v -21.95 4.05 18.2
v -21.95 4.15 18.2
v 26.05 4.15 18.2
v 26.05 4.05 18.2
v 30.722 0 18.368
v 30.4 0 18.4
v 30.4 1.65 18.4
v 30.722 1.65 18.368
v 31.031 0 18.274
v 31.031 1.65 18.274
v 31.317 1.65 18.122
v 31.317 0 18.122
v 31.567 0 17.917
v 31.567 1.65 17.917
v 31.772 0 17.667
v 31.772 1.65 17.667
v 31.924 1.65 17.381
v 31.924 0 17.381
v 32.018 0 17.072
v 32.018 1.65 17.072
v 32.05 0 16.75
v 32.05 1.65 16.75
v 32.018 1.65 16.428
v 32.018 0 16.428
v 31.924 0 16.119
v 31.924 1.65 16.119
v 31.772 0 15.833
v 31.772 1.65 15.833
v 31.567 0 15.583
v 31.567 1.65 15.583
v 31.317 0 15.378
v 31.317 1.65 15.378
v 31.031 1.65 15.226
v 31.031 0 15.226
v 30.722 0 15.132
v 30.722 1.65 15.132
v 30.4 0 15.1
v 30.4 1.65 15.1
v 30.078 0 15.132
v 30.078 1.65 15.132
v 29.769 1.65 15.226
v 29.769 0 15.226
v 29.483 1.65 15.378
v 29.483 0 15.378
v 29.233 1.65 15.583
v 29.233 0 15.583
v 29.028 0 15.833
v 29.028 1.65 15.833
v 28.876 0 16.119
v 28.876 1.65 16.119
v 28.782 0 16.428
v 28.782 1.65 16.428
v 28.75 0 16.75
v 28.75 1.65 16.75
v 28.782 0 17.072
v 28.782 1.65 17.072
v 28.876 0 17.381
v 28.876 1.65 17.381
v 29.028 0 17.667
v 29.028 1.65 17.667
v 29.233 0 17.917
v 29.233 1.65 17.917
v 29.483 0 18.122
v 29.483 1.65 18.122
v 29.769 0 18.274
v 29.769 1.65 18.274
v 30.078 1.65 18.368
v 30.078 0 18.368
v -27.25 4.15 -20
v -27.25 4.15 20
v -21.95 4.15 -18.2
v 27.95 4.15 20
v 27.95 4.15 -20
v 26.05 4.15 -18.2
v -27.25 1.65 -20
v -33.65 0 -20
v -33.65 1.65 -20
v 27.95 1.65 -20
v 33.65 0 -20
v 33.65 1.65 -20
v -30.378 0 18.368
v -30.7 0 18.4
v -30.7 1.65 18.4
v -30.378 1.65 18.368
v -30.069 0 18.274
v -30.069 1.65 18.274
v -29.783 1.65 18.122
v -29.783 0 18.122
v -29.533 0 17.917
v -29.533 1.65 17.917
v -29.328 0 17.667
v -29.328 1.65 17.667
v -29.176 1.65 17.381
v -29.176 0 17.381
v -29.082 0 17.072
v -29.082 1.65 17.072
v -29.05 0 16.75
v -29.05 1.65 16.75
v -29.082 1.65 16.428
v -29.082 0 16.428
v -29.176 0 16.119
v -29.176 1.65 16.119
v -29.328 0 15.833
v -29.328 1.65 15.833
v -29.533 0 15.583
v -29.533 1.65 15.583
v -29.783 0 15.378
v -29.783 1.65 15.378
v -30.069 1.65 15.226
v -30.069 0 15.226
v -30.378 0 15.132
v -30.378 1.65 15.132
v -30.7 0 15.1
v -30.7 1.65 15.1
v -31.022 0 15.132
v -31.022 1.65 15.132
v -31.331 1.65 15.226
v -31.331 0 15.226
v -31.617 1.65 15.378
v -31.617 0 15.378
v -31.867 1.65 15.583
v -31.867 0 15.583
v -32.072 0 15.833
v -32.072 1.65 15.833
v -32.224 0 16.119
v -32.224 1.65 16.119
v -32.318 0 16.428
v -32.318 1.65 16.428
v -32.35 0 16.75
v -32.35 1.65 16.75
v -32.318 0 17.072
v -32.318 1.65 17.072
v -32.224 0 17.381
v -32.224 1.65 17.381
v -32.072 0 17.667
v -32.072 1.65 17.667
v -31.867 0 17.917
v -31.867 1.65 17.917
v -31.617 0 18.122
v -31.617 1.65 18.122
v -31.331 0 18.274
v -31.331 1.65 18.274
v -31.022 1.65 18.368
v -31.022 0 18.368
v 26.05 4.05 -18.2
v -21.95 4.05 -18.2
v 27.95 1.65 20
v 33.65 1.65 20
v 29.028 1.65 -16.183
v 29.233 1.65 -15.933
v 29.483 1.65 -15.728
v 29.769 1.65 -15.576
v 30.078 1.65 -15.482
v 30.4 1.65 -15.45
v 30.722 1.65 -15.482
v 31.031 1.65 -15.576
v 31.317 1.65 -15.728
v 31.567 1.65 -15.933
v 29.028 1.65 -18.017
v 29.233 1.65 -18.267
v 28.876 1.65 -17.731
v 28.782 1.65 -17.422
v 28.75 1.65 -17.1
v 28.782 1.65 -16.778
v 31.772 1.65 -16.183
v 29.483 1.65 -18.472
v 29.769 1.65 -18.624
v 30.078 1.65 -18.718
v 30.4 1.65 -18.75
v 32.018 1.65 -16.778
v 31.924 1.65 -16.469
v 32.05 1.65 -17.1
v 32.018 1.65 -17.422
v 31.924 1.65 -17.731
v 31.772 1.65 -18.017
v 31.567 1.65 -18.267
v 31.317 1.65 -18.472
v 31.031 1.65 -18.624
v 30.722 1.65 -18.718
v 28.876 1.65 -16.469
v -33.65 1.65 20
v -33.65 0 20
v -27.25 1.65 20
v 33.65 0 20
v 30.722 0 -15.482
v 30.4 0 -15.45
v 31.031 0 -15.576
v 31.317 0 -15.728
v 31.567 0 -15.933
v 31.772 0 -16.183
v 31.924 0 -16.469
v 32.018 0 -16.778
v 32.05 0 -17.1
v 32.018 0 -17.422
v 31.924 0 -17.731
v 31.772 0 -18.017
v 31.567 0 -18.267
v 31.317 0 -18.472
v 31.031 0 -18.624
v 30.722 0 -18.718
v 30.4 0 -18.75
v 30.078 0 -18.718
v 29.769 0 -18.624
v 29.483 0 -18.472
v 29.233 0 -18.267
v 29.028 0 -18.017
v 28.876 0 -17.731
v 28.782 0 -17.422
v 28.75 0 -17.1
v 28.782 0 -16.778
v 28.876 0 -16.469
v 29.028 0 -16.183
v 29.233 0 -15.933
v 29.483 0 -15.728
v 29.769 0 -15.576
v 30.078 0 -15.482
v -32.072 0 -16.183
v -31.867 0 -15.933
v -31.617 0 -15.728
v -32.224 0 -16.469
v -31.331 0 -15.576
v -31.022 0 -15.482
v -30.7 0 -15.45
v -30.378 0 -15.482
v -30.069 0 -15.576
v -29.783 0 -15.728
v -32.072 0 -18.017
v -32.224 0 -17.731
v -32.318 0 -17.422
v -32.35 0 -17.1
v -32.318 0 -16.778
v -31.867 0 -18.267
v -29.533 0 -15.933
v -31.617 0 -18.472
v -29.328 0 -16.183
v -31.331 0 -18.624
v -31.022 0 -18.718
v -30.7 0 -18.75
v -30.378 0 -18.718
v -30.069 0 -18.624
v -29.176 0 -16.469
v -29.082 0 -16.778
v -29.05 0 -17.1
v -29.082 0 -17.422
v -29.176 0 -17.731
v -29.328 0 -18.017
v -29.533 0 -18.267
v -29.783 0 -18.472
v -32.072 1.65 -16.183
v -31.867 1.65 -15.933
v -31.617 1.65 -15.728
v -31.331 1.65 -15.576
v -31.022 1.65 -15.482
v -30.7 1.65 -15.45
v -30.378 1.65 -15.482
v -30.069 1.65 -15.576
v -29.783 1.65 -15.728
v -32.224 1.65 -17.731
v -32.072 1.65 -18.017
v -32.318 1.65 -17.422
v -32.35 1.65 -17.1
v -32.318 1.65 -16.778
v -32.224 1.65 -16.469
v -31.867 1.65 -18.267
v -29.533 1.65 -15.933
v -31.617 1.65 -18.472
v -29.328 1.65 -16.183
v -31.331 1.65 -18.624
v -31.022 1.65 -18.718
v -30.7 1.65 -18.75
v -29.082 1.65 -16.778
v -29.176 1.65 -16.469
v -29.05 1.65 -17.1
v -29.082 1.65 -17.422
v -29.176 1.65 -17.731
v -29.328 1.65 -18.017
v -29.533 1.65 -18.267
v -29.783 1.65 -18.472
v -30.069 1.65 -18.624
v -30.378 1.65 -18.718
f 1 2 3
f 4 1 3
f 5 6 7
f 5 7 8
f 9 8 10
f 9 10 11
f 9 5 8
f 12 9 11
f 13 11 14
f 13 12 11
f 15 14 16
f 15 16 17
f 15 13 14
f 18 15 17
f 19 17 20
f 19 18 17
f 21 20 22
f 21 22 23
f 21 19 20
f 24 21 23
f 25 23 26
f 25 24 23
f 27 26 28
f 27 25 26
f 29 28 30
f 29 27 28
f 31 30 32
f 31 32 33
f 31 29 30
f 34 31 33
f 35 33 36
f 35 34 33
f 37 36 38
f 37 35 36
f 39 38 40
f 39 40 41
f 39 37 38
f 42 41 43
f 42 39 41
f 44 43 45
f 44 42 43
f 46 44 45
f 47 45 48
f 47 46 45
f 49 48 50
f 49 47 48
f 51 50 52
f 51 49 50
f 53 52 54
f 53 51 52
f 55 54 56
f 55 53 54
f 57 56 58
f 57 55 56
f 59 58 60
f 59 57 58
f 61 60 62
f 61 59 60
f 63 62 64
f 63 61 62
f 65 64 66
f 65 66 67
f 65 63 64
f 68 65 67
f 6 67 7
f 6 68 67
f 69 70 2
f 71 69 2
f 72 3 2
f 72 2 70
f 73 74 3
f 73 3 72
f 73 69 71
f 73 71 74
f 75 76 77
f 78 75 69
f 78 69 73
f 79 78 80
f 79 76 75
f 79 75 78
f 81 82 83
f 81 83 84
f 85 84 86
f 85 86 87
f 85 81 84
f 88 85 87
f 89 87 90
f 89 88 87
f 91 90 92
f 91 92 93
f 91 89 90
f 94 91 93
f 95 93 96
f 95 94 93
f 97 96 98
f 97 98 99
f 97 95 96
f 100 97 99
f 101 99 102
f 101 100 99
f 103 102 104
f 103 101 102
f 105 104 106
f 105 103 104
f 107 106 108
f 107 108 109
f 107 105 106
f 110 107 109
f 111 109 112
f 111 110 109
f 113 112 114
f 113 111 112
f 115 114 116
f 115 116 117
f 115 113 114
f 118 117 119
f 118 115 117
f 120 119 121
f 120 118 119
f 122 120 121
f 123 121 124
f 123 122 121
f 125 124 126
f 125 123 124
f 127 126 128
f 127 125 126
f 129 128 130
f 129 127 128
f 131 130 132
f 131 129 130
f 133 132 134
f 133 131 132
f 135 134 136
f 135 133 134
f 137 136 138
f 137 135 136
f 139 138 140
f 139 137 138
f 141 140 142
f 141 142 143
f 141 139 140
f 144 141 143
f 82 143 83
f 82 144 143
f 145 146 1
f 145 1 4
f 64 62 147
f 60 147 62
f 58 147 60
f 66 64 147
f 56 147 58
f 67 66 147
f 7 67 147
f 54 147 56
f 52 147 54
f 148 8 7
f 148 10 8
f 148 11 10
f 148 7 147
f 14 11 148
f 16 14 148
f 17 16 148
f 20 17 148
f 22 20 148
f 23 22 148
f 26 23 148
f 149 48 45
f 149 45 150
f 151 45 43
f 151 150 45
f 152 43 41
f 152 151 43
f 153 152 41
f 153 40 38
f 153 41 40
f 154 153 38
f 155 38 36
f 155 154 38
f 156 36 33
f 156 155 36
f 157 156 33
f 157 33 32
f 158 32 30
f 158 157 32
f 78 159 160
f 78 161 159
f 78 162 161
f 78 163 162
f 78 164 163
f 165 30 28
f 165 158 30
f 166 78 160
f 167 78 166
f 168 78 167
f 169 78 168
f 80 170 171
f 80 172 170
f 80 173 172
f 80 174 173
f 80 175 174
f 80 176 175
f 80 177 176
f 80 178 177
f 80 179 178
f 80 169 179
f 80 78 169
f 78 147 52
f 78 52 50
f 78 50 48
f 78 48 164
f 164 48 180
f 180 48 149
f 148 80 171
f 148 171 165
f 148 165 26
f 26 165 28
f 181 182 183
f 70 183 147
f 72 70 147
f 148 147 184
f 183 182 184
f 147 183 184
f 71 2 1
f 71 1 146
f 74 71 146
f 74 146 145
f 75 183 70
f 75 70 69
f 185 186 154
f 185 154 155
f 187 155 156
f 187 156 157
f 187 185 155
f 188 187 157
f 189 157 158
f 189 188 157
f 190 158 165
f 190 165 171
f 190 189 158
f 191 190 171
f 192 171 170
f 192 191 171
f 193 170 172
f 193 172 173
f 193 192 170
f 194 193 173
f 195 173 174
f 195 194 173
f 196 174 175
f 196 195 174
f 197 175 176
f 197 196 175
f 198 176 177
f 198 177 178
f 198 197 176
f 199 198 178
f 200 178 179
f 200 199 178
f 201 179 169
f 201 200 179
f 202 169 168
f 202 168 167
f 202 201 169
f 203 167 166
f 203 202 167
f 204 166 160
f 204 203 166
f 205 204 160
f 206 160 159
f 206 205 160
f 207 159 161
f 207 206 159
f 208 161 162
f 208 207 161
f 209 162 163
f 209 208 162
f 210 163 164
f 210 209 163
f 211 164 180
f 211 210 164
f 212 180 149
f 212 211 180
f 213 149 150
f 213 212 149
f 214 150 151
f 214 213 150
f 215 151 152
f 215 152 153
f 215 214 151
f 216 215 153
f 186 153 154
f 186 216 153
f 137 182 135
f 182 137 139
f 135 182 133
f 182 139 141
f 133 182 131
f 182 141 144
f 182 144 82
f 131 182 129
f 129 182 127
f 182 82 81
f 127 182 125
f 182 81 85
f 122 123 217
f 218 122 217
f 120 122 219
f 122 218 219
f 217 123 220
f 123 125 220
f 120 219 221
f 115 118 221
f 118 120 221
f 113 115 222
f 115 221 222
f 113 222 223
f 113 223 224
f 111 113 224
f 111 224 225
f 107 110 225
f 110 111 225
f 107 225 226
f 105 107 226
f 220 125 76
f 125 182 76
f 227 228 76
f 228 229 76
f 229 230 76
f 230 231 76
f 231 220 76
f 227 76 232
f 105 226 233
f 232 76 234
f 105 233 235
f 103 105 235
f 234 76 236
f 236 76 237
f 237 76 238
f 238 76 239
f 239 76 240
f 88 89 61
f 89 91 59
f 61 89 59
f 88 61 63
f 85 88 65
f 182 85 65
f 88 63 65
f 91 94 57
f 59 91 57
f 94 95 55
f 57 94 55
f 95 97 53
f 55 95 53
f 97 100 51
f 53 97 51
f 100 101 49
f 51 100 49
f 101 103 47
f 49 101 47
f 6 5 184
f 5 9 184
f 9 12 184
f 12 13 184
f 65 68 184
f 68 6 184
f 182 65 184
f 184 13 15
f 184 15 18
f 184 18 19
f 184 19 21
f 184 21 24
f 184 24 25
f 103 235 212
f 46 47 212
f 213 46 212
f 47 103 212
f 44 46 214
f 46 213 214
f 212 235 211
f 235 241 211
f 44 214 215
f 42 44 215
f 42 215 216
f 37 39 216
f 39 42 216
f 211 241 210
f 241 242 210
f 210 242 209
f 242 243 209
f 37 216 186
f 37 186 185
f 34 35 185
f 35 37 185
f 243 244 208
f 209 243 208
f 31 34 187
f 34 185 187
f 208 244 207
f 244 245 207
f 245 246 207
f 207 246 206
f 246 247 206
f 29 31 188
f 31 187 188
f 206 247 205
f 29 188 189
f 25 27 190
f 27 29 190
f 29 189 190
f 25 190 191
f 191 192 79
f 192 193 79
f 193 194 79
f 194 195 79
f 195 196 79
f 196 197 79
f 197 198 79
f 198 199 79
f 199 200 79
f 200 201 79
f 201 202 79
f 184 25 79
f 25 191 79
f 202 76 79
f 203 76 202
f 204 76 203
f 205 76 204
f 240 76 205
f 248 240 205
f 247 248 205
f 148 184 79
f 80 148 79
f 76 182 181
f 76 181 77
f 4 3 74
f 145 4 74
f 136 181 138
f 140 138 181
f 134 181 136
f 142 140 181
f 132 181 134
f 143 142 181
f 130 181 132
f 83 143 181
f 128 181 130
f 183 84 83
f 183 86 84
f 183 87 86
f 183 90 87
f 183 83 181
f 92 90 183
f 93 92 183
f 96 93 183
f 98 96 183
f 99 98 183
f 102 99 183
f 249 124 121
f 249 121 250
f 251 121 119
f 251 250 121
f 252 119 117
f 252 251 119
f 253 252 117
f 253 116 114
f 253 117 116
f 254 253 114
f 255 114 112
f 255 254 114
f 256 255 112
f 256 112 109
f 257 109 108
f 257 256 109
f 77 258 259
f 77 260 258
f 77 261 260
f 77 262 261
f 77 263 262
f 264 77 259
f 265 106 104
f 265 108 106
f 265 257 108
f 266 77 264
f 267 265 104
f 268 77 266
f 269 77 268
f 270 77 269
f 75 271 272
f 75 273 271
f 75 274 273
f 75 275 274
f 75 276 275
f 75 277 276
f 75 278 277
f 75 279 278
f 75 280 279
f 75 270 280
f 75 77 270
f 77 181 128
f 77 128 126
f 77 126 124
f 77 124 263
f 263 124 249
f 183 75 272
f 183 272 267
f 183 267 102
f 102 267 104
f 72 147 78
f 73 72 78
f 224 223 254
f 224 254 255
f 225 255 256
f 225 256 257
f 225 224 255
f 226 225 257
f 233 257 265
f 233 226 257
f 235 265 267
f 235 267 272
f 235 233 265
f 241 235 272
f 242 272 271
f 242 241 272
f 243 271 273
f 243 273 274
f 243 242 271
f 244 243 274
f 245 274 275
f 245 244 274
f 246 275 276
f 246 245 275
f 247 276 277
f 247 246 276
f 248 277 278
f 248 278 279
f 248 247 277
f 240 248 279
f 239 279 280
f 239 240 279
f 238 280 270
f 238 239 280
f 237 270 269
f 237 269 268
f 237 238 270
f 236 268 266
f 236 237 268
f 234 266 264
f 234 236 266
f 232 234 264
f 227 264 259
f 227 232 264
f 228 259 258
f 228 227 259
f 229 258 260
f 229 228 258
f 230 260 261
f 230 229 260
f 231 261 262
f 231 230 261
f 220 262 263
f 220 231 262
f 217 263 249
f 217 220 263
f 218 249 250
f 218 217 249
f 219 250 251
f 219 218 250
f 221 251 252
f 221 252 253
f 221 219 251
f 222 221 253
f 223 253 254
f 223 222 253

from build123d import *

# Parameters (mm, degrees)
SKETCH1_W           = 67.3
SKETCH1_H           = 40
SKETCH1_R           = 1.65
BOSS_EXTRUDE1_DEPTH = 1.65
SKETCH2_W           = 55.2
SKETCH2_H           = 40
BOSS_EXTRUDE2_DEPTH = 2.5
SKETCH3_W           = 48
SKETCH3_H           = 36.4
CUT_EXTRUDE1_DEPTH  = 0.1


with BuildPart() as part:
    # Sketch1 → Boss-Extrude1 (new body)
    with BuildSketch(Plane(origin=(0, 0, 0), x_dir=(1, 0, 0), z_dir=(0, 1, 0))):
        Rectangle(SKETCH1_W, SKETCH1_H)
        with Locations(Location((-30.7, 17.1, 0), (0, 0, 270))):  # turned: the seam where the file's is
            Circle(SKETCH1_R, mode=Mode.SUBTRACT)
        with Locations(Location((-30.7, -16.75, 0), (0, 0, 270))):  # turned: the seam where the file's is
            Circle(SKETCH1_R, mode=Mode.SUBTRACT)
        with Locations(Location((30.4, -16.75, 0), (0, 0, 270))):  # turned: the seam where the file's is
            Circle(SKETCH1_R, mode=Mode.SUBTRACT)
        with Locations(Location((30.4, 17.1, 0), (0, 0, 270))):  # turned: the seam where the file's is
            Circle(SKETCH1_R, mode=Mode.SUBTRACT)
    extrude(amount=BOSS_EXTRUDE1_DEPTH)

    # Sketch2 → Boss-Extrude2 (add)
    with BuildSketch(Plane(origin=(0, 1.65, 0), x_dir=(1, 0, 0), z_dir=(0, 1, 0))):
        with Locations((0.35, 0)):
            Rectangle(SKETCH2_W, SKETCH2_H)
    extrude(amount=BOSS_EXTRUDE2_DEPTH)

    # Sketch3 → Cut-Extrude1 (cut)
    with BuildSketch(Plane(origin=(0, 4.15, 0), x_dir=(1, 0, 0), z_dir=(0, 1, 0))):
        with Locations((2.05, 0)):
            Rectangle(SKETCH3_W, SKETCH3_H)
    extrude(amount=-CUT_EXTRUDE1_DEPTH, mode=Mode.SUBTRACT)


solid = part.part
